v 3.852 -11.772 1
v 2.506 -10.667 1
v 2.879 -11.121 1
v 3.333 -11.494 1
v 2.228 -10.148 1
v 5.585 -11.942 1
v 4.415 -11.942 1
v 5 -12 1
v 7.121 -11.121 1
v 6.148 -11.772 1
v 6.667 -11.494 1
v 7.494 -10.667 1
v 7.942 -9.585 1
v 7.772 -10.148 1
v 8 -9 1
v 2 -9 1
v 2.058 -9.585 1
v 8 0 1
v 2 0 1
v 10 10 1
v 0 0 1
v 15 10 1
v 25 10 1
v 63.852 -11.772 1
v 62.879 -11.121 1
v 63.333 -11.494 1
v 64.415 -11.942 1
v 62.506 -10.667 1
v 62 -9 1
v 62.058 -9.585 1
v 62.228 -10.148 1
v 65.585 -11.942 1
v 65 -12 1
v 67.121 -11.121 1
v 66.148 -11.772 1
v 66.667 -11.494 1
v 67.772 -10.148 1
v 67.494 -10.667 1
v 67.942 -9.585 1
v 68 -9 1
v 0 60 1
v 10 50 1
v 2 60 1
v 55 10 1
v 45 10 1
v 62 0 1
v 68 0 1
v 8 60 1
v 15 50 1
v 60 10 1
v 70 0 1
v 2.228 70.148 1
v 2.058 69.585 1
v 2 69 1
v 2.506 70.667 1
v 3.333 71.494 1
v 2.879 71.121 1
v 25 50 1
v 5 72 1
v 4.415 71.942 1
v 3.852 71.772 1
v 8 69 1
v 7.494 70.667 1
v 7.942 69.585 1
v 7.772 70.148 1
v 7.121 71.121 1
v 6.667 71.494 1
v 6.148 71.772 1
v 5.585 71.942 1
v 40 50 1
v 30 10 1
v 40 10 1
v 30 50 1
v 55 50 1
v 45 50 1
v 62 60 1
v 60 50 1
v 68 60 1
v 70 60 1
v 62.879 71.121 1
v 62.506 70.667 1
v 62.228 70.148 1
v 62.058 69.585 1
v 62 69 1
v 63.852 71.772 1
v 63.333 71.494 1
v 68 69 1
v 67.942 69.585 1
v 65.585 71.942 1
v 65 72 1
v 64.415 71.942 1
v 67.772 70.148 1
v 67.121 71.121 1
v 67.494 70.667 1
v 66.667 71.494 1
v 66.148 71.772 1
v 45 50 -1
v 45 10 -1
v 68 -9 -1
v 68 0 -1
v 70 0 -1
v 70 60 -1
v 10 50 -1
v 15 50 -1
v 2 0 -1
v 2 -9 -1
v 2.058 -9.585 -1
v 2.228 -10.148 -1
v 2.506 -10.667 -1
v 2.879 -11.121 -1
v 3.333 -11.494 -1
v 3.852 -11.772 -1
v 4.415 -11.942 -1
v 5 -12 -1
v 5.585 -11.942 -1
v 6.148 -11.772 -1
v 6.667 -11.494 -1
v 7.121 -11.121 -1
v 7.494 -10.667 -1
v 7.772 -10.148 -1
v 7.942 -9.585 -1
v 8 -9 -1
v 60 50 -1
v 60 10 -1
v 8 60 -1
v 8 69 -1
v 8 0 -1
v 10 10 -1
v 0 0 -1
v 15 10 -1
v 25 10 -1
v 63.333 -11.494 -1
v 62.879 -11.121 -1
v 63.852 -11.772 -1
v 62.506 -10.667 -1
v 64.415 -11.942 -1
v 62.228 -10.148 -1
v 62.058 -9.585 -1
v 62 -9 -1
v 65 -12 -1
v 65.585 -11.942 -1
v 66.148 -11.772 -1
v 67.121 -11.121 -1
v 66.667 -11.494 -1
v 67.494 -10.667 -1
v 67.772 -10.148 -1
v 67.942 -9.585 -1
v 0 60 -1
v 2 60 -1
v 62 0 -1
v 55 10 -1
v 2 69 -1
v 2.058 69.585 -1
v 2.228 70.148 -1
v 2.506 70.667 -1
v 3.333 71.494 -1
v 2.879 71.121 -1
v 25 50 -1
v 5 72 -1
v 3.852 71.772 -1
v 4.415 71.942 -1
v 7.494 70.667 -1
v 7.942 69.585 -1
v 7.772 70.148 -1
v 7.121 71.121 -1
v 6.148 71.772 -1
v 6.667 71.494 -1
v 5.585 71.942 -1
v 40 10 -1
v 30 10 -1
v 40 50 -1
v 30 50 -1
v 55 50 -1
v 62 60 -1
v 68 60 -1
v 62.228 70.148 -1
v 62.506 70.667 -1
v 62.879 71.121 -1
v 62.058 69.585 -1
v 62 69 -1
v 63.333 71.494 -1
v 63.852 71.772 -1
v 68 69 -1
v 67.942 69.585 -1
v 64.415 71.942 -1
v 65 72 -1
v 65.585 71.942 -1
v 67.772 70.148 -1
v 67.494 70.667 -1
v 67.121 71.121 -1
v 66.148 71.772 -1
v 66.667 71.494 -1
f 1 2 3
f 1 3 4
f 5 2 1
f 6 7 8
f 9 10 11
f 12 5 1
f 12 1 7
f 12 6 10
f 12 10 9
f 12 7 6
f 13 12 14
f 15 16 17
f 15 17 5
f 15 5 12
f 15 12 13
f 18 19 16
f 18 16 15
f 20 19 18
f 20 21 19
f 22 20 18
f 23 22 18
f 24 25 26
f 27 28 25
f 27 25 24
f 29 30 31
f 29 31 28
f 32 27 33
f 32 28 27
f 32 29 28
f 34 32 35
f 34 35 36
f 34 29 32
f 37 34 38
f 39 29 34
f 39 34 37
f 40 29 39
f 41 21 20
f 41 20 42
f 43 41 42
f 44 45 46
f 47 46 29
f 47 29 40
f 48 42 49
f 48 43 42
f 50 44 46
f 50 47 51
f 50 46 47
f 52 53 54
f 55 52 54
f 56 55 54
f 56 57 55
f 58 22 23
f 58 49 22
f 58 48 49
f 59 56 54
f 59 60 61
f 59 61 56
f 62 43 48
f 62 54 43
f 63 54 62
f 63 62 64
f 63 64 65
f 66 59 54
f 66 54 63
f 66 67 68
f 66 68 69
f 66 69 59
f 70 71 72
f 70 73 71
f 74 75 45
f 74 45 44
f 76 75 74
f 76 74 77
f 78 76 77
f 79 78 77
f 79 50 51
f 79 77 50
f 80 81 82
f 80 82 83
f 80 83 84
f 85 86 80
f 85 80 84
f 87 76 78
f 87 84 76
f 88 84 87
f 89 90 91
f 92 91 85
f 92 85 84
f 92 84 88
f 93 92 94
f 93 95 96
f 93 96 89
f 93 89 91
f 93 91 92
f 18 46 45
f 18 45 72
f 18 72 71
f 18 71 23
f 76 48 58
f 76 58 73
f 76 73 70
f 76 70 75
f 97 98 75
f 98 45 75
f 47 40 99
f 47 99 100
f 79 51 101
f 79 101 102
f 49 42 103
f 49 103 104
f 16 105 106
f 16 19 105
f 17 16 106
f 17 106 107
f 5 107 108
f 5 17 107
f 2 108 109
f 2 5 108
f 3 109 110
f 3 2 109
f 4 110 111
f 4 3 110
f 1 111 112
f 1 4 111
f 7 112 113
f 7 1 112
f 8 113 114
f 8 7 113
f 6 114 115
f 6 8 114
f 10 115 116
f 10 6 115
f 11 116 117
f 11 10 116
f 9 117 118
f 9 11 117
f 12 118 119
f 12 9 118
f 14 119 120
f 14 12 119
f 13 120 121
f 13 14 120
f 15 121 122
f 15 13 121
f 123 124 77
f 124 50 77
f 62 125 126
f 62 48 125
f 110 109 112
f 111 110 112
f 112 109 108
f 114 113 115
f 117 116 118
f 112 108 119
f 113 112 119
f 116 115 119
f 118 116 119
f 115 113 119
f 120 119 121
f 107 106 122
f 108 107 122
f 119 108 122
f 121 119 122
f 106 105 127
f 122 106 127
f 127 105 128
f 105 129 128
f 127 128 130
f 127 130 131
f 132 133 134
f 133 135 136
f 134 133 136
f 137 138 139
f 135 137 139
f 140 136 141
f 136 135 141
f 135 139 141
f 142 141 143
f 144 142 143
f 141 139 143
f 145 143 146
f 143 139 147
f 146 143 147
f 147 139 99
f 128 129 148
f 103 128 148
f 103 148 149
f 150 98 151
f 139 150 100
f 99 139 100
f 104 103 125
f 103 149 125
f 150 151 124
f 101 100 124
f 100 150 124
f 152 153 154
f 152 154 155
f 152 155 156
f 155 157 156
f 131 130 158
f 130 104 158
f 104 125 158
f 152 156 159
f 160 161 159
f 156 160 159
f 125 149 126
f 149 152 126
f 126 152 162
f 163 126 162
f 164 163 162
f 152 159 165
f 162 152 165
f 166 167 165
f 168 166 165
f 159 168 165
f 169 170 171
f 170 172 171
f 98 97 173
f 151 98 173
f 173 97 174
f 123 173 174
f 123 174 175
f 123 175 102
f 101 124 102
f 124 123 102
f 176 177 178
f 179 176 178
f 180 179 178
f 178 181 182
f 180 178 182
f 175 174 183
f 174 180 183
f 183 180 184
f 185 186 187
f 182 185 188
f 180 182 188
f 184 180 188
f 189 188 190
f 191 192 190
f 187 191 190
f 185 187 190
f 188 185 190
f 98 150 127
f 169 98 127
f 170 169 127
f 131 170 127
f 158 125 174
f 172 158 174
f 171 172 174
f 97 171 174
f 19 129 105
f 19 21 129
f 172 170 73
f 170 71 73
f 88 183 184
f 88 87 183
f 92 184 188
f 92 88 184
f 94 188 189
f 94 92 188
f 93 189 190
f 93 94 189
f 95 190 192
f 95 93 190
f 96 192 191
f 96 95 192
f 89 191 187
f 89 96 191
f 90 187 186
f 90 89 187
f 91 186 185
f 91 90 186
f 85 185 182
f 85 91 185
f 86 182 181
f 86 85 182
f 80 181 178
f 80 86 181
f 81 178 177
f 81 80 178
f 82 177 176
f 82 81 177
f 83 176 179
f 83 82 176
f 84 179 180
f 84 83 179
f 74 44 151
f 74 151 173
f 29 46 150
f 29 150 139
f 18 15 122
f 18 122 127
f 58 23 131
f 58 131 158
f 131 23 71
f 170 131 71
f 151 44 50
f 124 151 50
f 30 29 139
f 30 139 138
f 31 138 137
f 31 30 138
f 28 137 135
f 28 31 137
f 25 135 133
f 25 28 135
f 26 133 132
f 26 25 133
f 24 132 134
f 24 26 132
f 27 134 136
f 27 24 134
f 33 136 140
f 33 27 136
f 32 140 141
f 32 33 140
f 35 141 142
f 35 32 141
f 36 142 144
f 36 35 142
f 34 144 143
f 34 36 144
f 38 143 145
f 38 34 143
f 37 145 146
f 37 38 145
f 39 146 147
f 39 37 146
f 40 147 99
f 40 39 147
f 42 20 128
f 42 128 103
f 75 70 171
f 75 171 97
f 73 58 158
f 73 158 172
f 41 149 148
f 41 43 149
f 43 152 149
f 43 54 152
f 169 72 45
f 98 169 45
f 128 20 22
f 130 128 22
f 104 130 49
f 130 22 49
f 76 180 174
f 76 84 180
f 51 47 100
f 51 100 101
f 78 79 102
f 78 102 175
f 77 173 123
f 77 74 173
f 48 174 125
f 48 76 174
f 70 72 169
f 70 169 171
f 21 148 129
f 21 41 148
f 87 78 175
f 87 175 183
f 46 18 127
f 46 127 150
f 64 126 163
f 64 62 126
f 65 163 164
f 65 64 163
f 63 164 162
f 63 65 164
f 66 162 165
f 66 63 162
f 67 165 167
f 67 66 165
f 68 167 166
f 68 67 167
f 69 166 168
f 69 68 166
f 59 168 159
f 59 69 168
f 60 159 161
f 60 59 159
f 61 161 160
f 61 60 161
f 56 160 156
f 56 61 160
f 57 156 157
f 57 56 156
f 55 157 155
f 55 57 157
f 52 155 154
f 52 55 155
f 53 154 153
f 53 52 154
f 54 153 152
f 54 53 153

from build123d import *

# Parameters (mm, degrees)
SKETCH_1_W      = 5
SKETCH_1_H      = 40
EXTRUDE_1_DEPTH = 1


with BuildPart() as part:
    # 草图1 → 凸台-拉伸1 (new, symmetric)
    with BuildSketch(Plane.XY):
        with BuildLine():
            Line((2, 0), (2, -9))
            ThreePointArc((2, -9), (5, -12), (8, -9))
            Line((8, -9), (8, 0))
            Line((8, 0), (62, 0))
            Line((62, 0), (62, -9))
            ThreePointArc((62, -9), (65, -12), (68, -9))
            Line((68, -9), (68, 0))
            Line((68, 0), (70, 0))
            Line((70, 0), (70, 60))
            Line((70, 60), (68, 60))
            Line((68, 60), (68, 69))
            ThreePointArc((68, 69), (65, 72), (62, 69))
            Line((62, 69), (62, 60))
            Line((62, 60), (8, 60))
            Line((8, 60), (8, 69))
            ThreePointArc((8, 69), (5, 72), (2, 69))
            Line((2, 69), (2, 60))
            Line((2, 60), (0, 60))
            Line((0, 60), (0, 0))
            Line((0, 0), (2, 0))
        make_face()
        with Locations((12.5, 30)):
            Rectangle(SKETCH_1_W, SKETCH_1_H, mode=Mode.SUBTRACT)
        with Locations((27.5, 30)):
            Rectangle(SKETCH_1_W, SKETCH_1_H, mode=Mode.SUBTRACT)
        with Locations((42.5, 30)):
            Rectangle(SKETCH_1_W, SKETCH_1_H, mode=Mode.SUBTRACT)
        with Locations((57.5, 30)):
            Rectangle(SKETCH_1_W, SKETCH_1_H, mode=Mode.SUBTRACT)
    extrude(amount=EXTRUDE_1_DEPTH, both=True)


solid = part.part
